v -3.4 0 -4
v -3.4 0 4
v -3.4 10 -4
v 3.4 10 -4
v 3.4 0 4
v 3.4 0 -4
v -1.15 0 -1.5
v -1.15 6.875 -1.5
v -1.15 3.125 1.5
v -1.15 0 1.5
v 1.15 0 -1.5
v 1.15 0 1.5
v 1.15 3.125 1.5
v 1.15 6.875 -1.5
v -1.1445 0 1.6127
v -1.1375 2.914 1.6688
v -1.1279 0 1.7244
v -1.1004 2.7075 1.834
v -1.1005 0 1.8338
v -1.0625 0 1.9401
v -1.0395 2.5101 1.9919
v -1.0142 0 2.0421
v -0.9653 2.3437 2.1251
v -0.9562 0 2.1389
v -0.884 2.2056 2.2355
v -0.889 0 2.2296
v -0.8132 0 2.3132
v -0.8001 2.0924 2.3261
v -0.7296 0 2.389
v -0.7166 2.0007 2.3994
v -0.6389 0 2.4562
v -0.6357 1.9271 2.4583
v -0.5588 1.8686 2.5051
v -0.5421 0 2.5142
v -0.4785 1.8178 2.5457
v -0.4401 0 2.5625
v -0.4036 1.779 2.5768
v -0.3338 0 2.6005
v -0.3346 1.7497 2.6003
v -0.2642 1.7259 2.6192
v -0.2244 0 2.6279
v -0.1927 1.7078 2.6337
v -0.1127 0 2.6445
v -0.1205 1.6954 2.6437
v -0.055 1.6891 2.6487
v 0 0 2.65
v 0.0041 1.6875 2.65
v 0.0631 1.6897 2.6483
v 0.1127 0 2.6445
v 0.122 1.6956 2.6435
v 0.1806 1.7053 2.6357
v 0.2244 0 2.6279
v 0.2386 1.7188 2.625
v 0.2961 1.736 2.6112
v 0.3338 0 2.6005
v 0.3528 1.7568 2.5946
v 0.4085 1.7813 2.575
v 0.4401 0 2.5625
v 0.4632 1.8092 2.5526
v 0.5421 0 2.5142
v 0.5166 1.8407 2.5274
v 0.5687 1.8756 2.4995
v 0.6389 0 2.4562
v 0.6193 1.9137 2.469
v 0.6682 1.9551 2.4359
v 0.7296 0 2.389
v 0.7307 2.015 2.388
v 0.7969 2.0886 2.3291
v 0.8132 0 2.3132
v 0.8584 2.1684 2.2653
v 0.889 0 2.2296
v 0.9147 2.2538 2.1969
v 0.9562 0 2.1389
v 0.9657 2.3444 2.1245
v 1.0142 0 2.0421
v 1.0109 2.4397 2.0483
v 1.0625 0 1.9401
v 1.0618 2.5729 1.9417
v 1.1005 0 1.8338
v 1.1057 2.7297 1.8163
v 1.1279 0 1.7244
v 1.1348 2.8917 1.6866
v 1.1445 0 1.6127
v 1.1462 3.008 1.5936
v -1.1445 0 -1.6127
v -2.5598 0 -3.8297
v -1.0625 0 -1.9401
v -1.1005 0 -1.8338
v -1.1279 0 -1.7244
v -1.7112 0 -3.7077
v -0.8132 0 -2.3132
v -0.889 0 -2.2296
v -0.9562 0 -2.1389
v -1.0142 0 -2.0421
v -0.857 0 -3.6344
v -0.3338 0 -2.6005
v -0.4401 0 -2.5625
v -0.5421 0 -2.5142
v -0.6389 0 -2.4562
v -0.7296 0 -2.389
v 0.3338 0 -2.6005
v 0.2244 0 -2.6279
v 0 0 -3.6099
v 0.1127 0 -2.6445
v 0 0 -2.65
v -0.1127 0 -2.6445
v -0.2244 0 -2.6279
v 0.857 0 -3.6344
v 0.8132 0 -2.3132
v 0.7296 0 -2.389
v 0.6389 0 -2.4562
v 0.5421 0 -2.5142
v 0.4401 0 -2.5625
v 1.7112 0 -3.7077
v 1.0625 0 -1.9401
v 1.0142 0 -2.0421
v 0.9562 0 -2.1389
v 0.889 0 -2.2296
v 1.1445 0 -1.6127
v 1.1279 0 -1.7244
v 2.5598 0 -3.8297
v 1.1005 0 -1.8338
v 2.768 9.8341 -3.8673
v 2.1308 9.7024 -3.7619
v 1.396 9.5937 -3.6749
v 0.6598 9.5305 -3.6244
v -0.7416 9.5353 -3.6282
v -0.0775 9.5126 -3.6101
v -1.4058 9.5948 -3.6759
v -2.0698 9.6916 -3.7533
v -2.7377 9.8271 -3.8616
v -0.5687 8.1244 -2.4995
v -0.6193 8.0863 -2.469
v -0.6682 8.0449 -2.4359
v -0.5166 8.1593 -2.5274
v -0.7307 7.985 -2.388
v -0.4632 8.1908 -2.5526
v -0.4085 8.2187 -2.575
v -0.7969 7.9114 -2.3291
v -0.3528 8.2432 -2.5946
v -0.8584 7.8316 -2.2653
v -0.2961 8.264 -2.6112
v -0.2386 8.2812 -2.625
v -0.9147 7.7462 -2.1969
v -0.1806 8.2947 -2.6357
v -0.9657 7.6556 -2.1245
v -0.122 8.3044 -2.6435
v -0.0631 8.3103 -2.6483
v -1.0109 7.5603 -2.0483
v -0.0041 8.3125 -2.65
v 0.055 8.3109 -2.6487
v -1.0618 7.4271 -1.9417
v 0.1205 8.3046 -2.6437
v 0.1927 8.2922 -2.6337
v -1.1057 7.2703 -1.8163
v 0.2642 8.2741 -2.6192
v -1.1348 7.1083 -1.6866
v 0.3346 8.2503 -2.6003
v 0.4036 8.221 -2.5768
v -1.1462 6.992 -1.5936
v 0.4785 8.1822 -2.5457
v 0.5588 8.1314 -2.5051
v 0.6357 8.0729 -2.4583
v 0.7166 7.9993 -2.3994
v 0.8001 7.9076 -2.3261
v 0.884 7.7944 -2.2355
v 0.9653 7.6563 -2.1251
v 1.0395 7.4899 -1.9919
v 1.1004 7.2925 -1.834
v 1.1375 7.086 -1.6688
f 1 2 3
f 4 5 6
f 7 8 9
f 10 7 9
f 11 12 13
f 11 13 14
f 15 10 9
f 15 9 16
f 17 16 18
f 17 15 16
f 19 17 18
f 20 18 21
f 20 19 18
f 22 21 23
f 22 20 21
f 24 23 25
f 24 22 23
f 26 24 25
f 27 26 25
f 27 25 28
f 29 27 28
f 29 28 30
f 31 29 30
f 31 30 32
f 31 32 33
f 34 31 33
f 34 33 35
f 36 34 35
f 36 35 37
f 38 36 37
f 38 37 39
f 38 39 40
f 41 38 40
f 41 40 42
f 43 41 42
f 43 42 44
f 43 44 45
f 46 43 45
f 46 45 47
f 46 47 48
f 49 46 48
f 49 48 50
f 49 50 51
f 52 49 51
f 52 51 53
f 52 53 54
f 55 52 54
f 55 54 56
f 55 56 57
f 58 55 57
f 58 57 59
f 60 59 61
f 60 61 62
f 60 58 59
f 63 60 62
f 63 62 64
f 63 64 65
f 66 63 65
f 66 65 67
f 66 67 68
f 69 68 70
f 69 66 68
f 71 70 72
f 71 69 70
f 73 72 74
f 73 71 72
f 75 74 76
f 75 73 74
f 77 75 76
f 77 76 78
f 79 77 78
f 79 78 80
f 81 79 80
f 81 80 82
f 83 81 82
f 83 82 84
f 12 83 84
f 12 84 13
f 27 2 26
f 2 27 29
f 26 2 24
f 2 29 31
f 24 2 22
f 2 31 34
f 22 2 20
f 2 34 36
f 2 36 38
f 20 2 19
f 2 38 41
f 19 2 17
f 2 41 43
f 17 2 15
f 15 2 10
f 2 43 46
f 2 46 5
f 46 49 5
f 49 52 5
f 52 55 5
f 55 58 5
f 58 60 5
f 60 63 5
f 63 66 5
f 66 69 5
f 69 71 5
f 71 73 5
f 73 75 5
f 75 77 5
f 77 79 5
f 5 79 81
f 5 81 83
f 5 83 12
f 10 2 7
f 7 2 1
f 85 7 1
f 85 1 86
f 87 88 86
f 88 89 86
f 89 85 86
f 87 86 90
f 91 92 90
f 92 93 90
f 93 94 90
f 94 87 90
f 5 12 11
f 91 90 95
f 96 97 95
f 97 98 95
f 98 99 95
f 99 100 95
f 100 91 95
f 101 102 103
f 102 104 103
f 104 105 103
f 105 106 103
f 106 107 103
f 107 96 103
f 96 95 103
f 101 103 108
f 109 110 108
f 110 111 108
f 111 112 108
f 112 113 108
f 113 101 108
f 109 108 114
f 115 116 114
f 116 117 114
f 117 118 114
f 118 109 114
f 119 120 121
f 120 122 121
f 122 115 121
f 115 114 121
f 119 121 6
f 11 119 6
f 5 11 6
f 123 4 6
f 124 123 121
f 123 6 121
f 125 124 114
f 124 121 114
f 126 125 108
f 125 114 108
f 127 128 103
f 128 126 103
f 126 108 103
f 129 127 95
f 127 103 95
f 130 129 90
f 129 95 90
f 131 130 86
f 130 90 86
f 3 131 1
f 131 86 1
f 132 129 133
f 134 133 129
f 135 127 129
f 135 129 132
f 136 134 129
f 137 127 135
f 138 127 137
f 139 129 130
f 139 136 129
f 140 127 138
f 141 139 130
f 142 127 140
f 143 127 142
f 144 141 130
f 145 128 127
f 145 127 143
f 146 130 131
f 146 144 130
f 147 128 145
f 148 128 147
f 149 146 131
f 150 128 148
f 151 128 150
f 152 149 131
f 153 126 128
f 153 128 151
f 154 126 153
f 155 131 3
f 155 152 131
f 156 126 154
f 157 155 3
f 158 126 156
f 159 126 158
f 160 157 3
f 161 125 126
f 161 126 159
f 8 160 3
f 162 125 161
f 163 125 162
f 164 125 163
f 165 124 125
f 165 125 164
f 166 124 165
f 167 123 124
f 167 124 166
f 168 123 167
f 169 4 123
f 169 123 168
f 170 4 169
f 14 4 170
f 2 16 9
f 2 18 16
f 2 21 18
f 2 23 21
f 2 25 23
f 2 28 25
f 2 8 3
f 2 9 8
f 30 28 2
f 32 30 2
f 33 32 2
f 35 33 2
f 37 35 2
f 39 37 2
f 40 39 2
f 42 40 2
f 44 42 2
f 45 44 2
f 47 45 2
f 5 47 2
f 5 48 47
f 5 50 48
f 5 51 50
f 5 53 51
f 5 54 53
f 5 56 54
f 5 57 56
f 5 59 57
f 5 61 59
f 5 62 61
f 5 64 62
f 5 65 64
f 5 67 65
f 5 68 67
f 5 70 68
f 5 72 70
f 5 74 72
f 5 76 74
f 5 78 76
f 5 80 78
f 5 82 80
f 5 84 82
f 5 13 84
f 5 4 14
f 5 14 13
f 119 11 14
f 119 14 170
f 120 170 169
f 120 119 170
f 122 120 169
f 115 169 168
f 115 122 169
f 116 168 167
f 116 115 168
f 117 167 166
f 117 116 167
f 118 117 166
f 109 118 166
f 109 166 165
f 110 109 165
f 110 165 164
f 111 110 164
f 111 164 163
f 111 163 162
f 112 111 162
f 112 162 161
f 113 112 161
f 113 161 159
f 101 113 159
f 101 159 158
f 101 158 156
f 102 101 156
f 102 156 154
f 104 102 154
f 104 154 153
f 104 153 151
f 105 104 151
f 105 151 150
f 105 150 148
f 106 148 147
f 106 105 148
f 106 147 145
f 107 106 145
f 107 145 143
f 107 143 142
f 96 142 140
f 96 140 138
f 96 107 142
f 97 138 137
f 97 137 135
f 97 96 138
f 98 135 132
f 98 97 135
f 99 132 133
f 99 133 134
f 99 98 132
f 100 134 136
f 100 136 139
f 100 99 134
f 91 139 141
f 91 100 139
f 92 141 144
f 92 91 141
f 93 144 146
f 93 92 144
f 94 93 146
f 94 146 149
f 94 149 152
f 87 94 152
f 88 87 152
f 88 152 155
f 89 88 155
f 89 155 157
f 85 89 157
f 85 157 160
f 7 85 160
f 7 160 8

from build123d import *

# Parameters (mm, degrees)
SKETCH1_W      = 6.8
SKETCH1_H      = 8
EXTRUDE1_DEPTH = 10
EXTRUDE2_DEPTH = 7.8
EXTRUDE3_DEPTH = 11
SKETCH4_R      = 15.011245784
EXTRUDE4_DEPTH = 11


with BuildPart() as part:
    # Sketch1 → Extrude1 (new body)
    with BuildSketch(Plane(origin=(0, 0, 0), x_dir=(1, 0, 0), z_dir=(0, 1, 0))):
        Rectangle(SKETCH1_W, SKETCH1_H)
    extrude(amount=EXTRUDE1_DEPTH)

    # Sketch2 → Extrude2 (cut, through all)
    with BuildSketch(Plane(origin=(3.4, 0, 0), x_dir=(0, 0, -1), z_dir=(1, 0, 0))):
        Polygon((4, 10), (-4, 0), (-4, 10), align=None)
    extrude(amount=-EXTRUDE2_DEPTH, mode=Mode.SUBTRACT)

    # Sketch3 → Extrude3 (cut, through all)
    with BuildSketch(Plane.XZ):
        with BuildLine():
            Line((1.15, 1.5), (1.15, -1.5))
            ThreePointArc((1.15, -1.5), (0, -2.65), (-1.15, -1.5))
            Line((-1.15, -1.5), (-1.15, 1.5))
            ThreePointArc((-1.15, 1.5), (0, 2.65), (1.15, 1.5))
        make_face()
    extrude(amount=-EXTRUDE3_DEPTH, mode=Mode.SUBTRACT)

    # Sketch4 → Extrude4 (cut, through all)
    with BuildSketch(Plane.XZ):
        with Locations((0, -18.621131967)):
            Circle(SKETCH4_R)
    extrude(amount=-EXTRUDE4_DEPTH, mode=Mode.SUBTRACT)


solid = part.part
